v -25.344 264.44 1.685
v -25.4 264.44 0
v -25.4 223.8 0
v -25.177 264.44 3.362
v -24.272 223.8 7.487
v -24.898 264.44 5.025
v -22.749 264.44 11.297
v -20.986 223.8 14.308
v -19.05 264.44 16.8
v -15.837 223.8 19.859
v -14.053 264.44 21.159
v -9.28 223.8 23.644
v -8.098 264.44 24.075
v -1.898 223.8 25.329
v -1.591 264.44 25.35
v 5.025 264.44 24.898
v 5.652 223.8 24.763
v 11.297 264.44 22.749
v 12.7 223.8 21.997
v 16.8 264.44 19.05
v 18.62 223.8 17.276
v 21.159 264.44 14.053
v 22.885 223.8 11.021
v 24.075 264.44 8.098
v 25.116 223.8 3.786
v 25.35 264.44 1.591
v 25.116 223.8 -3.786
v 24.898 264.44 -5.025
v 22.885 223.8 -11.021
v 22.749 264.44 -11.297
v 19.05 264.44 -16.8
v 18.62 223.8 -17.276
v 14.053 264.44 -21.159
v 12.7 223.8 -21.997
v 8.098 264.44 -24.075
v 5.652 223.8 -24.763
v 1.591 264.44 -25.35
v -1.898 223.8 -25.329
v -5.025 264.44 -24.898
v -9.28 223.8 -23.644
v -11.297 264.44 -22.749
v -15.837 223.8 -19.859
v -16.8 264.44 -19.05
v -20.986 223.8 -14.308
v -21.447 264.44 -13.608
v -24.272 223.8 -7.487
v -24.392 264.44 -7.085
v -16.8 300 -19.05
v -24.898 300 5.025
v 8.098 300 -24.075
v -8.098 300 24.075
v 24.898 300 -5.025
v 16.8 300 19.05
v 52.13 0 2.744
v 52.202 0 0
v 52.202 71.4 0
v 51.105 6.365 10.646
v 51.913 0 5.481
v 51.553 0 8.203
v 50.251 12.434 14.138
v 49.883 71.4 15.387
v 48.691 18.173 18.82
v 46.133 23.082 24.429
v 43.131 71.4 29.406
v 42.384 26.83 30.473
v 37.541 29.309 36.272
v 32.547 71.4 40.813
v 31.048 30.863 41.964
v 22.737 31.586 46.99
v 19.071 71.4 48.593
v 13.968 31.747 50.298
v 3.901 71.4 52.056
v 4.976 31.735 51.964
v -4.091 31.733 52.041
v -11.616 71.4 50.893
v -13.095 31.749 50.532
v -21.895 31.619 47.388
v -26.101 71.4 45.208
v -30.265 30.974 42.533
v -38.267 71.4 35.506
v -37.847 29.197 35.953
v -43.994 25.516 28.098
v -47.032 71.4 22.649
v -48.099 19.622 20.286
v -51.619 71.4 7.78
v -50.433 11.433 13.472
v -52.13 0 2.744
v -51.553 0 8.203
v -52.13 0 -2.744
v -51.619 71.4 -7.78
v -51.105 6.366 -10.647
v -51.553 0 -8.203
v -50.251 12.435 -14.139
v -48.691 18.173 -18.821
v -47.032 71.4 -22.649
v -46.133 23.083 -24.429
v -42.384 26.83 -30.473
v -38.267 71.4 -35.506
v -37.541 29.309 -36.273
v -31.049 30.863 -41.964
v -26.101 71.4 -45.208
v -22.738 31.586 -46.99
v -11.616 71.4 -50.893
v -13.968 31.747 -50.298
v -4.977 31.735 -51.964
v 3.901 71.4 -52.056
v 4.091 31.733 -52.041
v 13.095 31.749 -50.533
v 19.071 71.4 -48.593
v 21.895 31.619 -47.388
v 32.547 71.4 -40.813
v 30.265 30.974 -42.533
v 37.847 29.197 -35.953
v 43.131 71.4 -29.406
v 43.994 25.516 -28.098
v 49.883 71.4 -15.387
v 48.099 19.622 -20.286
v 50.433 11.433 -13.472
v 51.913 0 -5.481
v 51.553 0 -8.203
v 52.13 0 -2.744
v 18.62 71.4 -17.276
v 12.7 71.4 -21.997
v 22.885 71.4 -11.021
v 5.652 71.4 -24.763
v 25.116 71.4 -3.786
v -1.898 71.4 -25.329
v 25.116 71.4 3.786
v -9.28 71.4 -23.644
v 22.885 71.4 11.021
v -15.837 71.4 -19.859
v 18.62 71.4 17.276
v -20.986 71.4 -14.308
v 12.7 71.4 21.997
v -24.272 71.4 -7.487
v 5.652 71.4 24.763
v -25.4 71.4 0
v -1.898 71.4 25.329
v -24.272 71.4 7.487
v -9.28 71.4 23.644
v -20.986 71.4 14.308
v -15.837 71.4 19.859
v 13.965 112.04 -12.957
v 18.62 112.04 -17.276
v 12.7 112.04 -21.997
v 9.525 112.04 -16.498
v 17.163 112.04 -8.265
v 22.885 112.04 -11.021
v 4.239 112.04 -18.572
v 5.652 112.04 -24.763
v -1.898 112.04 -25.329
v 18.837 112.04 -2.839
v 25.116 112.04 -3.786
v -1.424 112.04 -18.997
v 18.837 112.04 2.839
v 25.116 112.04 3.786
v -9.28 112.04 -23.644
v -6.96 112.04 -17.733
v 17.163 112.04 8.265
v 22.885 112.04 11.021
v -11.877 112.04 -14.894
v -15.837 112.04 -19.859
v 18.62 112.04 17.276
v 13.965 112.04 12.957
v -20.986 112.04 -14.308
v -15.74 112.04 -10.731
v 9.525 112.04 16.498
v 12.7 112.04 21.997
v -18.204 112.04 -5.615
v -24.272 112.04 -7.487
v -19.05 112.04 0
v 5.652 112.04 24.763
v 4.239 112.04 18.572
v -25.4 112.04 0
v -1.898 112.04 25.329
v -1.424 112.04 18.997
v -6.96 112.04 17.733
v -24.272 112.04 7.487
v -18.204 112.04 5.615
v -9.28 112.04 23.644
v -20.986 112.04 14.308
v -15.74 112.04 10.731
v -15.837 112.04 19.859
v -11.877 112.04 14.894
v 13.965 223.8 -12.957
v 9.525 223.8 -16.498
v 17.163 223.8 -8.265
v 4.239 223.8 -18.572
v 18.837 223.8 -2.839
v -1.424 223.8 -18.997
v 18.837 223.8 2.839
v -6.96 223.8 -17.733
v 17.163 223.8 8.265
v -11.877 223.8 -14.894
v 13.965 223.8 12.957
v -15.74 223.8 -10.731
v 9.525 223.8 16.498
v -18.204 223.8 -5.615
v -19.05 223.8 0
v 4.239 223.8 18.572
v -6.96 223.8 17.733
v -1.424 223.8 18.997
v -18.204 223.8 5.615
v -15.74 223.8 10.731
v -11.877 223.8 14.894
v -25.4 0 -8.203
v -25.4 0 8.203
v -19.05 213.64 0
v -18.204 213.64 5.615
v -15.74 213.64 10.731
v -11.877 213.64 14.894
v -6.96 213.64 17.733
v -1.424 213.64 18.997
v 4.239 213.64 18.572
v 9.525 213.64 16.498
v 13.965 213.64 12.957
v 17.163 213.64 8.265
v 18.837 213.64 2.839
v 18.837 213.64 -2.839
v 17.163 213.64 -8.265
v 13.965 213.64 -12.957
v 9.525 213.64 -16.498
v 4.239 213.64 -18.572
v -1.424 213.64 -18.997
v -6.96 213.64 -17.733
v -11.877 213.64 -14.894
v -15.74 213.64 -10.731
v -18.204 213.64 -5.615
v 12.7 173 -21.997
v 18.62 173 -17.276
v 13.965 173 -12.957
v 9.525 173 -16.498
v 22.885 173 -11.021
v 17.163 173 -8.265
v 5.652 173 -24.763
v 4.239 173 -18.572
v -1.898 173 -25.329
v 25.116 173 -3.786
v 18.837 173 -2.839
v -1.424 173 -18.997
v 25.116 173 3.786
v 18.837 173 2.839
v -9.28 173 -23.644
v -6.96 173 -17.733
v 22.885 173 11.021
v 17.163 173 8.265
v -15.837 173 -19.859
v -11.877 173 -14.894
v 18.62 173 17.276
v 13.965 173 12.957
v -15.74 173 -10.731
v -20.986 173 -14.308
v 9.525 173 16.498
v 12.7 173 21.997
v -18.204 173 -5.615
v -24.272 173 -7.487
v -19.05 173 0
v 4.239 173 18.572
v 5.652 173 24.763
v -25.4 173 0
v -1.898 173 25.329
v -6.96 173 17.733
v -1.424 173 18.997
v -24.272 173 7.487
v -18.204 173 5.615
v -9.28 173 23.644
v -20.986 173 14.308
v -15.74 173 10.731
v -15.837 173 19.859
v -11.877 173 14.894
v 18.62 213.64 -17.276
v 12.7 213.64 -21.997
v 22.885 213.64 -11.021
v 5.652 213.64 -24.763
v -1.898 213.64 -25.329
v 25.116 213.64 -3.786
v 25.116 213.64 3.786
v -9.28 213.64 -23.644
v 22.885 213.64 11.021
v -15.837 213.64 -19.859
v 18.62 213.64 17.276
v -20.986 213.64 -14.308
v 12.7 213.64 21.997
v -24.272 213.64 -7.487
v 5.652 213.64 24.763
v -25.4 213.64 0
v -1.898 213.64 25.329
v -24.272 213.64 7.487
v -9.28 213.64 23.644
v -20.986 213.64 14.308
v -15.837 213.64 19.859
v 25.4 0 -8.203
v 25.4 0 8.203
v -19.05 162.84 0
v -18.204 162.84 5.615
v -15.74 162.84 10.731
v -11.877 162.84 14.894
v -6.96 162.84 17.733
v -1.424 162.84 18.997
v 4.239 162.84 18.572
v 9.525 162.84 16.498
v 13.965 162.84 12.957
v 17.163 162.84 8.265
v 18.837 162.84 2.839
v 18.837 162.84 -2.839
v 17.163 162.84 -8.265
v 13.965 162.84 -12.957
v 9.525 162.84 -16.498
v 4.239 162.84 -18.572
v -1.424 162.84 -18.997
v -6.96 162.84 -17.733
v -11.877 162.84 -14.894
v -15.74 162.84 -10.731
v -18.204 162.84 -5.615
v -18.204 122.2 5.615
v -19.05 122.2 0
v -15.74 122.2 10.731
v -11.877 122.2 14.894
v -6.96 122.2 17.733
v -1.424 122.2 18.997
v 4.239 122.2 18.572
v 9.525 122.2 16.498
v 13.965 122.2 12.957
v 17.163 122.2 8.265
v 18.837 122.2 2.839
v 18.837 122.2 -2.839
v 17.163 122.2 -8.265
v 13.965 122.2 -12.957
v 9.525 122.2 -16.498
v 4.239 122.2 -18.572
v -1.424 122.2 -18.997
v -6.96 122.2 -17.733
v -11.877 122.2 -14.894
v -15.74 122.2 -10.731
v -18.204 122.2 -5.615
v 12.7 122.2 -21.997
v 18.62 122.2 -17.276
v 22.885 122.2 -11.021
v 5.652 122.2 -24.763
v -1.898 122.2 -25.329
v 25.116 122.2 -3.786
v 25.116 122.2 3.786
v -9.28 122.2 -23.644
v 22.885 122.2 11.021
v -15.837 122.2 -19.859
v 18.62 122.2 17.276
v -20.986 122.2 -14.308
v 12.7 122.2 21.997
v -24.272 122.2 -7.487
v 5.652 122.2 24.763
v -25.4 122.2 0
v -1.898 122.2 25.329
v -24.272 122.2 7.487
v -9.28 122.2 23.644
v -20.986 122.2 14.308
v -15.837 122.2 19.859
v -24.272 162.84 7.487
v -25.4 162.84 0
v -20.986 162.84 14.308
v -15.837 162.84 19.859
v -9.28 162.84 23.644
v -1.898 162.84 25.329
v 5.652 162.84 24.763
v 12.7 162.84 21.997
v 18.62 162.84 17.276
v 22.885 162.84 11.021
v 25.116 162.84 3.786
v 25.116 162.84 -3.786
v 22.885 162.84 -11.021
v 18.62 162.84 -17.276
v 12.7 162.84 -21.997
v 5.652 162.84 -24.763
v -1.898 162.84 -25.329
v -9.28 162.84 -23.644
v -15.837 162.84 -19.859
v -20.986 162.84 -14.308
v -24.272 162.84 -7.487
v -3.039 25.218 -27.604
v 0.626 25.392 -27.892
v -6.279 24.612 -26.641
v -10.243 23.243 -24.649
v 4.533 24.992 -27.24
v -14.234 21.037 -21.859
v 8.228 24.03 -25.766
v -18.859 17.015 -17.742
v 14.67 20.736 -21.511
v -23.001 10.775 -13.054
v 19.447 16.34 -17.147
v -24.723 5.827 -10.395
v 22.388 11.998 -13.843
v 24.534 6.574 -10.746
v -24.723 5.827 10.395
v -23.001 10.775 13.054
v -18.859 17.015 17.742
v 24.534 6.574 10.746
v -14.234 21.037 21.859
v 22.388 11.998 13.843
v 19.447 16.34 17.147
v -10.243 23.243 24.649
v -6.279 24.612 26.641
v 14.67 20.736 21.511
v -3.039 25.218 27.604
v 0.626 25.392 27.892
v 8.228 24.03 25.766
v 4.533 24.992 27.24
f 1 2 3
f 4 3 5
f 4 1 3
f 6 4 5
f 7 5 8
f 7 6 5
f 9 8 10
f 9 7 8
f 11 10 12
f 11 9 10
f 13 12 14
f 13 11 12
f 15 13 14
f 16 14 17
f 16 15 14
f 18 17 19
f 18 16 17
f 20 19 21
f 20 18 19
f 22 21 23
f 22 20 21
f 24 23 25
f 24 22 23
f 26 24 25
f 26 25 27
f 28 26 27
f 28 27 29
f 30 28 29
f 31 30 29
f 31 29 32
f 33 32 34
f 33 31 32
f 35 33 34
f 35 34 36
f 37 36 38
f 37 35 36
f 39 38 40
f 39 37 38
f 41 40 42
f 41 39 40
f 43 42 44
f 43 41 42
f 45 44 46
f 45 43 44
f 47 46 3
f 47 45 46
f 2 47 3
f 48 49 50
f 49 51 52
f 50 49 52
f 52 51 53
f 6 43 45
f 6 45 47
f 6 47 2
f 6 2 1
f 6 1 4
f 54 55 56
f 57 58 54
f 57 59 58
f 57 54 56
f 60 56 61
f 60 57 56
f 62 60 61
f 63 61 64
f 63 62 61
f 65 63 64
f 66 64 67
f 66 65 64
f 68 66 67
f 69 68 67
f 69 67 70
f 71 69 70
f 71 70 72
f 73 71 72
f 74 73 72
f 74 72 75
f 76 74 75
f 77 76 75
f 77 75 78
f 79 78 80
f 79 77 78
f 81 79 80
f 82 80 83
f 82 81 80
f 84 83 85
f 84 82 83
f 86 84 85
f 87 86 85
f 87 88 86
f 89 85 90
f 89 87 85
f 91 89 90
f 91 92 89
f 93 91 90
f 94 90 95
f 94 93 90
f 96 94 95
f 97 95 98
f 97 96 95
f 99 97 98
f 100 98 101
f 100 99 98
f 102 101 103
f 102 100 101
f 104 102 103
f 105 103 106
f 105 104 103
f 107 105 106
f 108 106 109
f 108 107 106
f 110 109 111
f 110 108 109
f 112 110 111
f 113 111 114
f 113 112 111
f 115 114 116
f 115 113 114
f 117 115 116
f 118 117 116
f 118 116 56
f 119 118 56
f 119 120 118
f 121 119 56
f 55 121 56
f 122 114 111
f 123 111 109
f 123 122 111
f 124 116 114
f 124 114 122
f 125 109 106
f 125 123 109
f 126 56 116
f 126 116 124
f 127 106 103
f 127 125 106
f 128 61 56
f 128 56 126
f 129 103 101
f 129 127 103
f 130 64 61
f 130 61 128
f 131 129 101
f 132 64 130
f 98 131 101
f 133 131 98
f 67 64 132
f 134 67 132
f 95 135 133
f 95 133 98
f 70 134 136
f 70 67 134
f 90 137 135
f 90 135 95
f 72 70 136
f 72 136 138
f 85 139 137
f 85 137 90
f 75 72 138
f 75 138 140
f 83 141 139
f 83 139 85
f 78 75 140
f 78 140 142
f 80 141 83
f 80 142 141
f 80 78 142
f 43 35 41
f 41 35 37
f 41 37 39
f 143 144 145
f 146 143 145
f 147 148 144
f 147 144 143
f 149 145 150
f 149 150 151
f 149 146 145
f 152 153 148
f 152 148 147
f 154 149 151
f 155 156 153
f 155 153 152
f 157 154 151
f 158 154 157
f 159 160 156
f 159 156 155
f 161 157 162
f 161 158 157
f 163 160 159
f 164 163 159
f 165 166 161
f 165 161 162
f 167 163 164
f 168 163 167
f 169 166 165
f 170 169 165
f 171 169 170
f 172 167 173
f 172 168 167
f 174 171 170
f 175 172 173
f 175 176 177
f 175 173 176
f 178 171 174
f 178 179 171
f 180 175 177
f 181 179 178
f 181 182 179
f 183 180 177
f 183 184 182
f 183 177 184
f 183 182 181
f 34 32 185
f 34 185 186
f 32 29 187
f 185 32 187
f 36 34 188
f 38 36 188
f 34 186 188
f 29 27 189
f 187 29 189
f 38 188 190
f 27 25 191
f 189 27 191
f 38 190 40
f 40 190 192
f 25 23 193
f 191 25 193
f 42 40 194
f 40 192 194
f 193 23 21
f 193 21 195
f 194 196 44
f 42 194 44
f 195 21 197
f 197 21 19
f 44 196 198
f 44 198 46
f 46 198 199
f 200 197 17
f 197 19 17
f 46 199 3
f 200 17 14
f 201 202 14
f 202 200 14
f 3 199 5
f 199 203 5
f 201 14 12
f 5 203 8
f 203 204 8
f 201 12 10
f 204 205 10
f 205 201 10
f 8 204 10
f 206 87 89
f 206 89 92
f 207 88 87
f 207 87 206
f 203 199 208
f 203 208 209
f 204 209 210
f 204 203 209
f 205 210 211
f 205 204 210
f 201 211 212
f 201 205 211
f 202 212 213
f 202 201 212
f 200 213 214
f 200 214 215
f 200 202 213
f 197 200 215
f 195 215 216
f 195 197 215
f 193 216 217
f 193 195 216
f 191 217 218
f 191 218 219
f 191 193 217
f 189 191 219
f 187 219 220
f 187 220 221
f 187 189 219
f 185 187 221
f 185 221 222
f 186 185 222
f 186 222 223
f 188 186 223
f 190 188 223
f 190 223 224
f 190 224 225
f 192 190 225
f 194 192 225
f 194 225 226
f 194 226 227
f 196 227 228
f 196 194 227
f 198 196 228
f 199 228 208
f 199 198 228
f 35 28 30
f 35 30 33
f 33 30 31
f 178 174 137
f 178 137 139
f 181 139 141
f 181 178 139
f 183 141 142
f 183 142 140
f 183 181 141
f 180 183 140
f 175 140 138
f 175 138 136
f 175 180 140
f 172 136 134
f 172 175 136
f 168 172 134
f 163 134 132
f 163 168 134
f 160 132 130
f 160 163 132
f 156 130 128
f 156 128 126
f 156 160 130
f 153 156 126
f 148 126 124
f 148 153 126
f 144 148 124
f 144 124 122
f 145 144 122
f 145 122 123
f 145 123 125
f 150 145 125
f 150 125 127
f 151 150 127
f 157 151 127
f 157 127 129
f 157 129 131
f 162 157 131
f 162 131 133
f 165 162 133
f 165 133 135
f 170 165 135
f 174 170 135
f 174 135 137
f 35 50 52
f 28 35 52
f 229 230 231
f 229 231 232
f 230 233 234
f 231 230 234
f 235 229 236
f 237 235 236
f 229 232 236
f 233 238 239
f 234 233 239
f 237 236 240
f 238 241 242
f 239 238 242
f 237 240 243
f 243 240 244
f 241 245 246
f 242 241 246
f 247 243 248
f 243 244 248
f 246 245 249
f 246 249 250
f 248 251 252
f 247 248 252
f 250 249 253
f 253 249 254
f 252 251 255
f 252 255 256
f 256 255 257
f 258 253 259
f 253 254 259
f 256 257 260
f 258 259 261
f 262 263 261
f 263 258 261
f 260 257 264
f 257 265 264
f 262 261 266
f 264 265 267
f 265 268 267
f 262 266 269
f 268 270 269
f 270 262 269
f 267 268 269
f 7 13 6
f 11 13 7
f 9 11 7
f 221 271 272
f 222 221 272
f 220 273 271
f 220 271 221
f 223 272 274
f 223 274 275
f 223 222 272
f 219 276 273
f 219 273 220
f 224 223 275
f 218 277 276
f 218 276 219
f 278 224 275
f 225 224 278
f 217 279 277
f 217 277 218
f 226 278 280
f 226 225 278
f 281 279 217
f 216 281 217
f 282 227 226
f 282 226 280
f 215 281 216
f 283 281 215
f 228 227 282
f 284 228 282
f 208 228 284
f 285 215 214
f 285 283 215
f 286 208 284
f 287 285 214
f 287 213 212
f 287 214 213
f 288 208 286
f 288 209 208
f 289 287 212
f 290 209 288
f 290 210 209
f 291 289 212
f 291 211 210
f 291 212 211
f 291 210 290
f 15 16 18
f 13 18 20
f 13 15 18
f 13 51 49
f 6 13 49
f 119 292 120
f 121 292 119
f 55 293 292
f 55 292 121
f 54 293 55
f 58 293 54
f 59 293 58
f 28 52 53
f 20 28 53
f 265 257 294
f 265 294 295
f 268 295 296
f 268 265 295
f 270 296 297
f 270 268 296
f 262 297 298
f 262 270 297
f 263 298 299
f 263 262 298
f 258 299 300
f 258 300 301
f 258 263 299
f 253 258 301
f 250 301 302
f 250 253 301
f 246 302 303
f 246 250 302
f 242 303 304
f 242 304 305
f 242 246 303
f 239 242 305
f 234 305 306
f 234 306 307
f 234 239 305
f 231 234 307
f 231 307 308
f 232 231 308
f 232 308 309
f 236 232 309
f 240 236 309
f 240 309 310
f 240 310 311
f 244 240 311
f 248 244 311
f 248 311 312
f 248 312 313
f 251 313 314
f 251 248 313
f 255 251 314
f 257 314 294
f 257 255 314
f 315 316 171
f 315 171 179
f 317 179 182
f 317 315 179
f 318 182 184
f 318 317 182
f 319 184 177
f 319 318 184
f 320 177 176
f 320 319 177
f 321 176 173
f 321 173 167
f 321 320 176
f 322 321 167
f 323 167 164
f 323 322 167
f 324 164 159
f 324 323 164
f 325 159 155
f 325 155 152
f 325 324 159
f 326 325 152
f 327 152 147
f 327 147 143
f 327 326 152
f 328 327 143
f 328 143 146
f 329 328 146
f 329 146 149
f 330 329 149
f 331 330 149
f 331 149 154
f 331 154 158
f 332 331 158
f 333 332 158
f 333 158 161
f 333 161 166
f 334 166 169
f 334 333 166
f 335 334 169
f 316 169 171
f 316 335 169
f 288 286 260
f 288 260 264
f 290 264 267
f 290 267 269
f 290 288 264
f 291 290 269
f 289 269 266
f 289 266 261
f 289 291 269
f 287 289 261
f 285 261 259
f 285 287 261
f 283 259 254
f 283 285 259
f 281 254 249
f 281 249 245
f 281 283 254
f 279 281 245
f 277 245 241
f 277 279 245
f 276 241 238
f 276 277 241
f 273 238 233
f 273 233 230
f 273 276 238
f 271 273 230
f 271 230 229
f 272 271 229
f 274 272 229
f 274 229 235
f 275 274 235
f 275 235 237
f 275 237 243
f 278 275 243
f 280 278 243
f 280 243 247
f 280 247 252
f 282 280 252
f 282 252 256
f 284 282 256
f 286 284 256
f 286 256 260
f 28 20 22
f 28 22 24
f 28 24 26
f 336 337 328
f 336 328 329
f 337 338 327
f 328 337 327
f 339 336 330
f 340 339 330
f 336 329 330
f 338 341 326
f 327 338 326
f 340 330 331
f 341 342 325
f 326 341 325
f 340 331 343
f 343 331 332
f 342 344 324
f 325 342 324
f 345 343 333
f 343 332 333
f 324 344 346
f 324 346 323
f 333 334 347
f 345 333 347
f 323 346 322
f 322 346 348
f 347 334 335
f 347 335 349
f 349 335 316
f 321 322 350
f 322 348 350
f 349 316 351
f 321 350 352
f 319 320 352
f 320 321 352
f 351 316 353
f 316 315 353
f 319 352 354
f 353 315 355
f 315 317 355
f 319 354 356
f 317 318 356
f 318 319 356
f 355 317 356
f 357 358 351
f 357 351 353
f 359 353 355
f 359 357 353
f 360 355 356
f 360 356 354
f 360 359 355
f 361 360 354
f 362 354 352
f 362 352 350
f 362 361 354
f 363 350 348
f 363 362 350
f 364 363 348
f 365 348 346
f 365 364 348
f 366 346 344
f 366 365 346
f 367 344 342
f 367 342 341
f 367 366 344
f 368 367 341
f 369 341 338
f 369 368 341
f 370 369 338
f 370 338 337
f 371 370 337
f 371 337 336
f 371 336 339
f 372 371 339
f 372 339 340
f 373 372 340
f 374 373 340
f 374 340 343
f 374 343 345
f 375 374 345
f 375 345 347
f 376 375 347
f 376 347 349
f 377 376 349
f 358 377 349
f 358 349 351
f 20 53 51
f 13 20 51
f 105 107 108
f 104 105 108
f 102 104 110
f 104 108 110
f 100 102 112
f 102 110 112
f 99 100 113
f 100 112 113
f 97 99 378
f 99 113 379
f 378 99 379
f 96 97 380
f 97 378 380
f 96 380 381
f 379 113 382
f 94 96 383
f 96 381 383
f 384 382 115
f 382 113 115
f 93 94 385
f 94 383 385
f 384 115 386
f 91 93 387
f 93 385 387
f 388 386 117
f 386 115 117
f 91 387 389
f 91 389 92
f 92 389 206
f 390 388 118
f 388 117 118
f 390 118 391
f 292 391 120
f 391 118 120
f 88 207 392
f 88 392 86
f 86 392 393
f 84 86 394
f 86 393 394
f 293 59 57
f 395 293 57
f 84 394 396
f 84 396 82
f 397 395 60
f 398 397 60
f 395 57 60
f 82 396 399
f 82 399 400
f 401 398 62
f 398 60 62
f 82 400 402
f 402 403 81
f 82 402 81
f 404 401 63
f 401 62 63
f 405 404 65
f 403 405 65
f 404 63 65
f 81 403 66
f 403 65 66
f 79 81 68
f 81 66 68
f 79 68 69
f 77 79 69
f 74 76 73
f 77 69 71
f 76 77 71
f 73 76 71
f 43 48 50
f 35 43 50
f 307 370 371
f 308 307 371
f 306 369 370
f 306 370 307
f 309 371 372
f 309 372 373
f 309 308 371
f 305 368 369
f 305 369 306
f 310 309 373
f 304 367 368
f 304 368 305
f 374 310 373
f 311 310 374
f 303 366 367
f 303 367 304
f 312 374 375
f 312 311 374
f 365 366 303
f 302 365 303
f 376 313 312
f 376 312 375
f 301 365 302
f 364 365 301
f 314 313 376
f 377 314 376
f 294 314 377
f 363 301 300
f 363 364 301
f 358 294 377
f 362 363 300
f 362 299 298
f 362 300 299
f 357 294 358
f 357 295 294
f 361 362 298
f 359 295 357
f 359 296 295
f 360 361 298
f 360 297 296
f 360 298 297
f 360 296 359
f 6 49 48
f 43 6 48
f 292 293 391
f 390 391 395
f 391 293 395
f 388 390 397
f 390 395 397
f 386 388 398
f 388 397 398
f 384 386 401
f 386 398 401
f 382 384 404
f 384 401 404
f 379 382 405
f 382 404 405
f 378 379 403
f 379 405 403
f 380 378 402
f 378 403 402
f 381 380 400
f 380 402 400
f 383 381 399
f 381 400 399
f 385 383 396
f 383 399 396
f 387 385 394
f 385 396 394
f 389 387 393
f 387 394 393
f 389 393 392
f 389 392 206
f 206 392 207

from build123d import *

# Parameters (mm, degrees)
F0_R      = 52.201743604
F1_DEPTH  = 300
F3_R      = 25.4
F4_DEPTH  = 152.4
F6_R      = 44.45
F7_DEPTH  = 152.4
F8_R      = 52.201743604
F8_R_2    = 25.4
F9_DEPTH  = 228.6
F13_R     = 31.75
F13_R_2   = 19.05
F15_R     = 31.75
F15_R_2   = 19.05
F14_R     = 31.75
F14_R_2   = 19.05
F16_DEPTH = 10.16
F18_DEPTH = 35.56


with BuildPart() as f1:
    # F0 (on Front) → F1 (new body)
    with BuildSketch(Plane.XZ):
        Circle(F0_R)
    extrude(amount=-F1_DEPTH)

    # F3 (on offset) → F4 (cut)
    with BuildSketch(Plane.XY.offset(63.5)):
        Circle(F3_R)
    extrude(amount=-F4_DEPTH, mode=Mode.SUBTRACT)

    # F6 (on offset) → F7 (cut)
    with BuildSketch(Plane.YZ.offset(63.5)):
        with Locations((-12.7, -50.8)):
            Circle(F6_R)
        with Locations((-12.7, 50.8)):
            Circle(F6_R)
    extrude(amount=-F7_DEPTH, mode=Mode.SUBTRACT)

    # F8 (on face) → F9 (cut)
    with BuildSketch(Plane(origin=(0, 300, 0), x_dir=(-1, 0, 0), z_dir=(0, 1, 0))):
        Circle(F8_R)
        Circle(F8_R_2, mode=Mode.SUBTRACT)
    extrude(amount=-F9_DEPTH, mode=Mode.SUBTRACT)

    # F13 (on offset) + F15 (on offset) + F14 (on offset) → F16 (cut)
    with BuildSketch(Plane(origin=(0, 122.2, 0), x_dir=(-1, 0, 0), z_dir=(0, 1, 0))):
        Circle(F13_R)
        Circle(F13_R_2, mode=Mode.SUBTRACT)
    with BuildSketch(Plane(origin=(0, 173, 0), x_dir=(-1, 0, 0), z_dir=(0, 1, 0))):
        Circle(F15_R)
        Circle(F15_R_2, mode=Mode.SUBTRACT)
    with BuildSketch(Plane(origin=(0, 223.8, 0), x_dir=(-1, 0, 0), z_dir=(0, 1, 0))):
        Circle(F14_R)
        Circle(F14_R_2, mode=Mode.SUBTRACT)
    extrude(amount=-F16_DEPTH, mode=Mode.SUBTRACT)

    # F17 (on face) → F18 (cut)
    with BuildSketch(Plane(origin=(0, 300, 0), x_dir=(-1, 0, 0), z_dir=(0, 1, 0))):
        with BuildLine():
            Line((-24.8980583787, -5.0246083398), (-16.8004676557, 19.050046891))
            ThreePointArc((-16.8004676557, 19.050046891), (-24.0746552308, 8.097590723), (-24.8980583787, -5.0246083398))
        make_face()
        with BuildLine():
            Line((-16.8004676557, 19.050046891), (8.097590723, 24.0746552308))
            ThreePointArc((8.097590723, 24.0746552308), (-5.0246083398, 24.8980583787), (-16.8004676557, 19.050046891))
        make_face()
        with BuildLine():
            Line((8.097590723, 24.0746552308), (24.8980583787, 5.0246083398))
            ThreePointArc((24.8980583787, 5.0246083398), (19.050046891, 16.8004676557), (8.097590723, 24.0746552308))
        make_face()
        with BuildLine():
            ThreePointArc((16.8004676557, -19.050046891), (23.1505062413, -10.4505531324), (25.4, 0))
            ThreePointArc((25.4, 0), (25.2742030816, 2.5248086244), (24.8980583787, 5.0246083398))
            Line((24.8980583787, 5.0246083398), (16.8004676557, -19.050046891))
        make_face()
        with BuildLine():
            ThreePointArc((-8.097590723, -24.0746552308), (5.0246083398, -24.8980583787), (16.8004676557, -19.050046891))
            Line((16.8004676557, -19.050046891), (-8.097590723, -24.0746552308))
        make_face()
        with BuildLine():
            ThreePointArc((-24.8980583787, -5.0246083398), (-19.050046891, -16.8004676557), (-8.097590723, -24.0746552308))
            Line((-8.097590723, -24.0746552308), (-24.8980583787, -5.0246083398))
        make_face()
    extrude(amount=-F18_DEPTH, mode=Mode.SUBTRACT)


solid = f1.part
